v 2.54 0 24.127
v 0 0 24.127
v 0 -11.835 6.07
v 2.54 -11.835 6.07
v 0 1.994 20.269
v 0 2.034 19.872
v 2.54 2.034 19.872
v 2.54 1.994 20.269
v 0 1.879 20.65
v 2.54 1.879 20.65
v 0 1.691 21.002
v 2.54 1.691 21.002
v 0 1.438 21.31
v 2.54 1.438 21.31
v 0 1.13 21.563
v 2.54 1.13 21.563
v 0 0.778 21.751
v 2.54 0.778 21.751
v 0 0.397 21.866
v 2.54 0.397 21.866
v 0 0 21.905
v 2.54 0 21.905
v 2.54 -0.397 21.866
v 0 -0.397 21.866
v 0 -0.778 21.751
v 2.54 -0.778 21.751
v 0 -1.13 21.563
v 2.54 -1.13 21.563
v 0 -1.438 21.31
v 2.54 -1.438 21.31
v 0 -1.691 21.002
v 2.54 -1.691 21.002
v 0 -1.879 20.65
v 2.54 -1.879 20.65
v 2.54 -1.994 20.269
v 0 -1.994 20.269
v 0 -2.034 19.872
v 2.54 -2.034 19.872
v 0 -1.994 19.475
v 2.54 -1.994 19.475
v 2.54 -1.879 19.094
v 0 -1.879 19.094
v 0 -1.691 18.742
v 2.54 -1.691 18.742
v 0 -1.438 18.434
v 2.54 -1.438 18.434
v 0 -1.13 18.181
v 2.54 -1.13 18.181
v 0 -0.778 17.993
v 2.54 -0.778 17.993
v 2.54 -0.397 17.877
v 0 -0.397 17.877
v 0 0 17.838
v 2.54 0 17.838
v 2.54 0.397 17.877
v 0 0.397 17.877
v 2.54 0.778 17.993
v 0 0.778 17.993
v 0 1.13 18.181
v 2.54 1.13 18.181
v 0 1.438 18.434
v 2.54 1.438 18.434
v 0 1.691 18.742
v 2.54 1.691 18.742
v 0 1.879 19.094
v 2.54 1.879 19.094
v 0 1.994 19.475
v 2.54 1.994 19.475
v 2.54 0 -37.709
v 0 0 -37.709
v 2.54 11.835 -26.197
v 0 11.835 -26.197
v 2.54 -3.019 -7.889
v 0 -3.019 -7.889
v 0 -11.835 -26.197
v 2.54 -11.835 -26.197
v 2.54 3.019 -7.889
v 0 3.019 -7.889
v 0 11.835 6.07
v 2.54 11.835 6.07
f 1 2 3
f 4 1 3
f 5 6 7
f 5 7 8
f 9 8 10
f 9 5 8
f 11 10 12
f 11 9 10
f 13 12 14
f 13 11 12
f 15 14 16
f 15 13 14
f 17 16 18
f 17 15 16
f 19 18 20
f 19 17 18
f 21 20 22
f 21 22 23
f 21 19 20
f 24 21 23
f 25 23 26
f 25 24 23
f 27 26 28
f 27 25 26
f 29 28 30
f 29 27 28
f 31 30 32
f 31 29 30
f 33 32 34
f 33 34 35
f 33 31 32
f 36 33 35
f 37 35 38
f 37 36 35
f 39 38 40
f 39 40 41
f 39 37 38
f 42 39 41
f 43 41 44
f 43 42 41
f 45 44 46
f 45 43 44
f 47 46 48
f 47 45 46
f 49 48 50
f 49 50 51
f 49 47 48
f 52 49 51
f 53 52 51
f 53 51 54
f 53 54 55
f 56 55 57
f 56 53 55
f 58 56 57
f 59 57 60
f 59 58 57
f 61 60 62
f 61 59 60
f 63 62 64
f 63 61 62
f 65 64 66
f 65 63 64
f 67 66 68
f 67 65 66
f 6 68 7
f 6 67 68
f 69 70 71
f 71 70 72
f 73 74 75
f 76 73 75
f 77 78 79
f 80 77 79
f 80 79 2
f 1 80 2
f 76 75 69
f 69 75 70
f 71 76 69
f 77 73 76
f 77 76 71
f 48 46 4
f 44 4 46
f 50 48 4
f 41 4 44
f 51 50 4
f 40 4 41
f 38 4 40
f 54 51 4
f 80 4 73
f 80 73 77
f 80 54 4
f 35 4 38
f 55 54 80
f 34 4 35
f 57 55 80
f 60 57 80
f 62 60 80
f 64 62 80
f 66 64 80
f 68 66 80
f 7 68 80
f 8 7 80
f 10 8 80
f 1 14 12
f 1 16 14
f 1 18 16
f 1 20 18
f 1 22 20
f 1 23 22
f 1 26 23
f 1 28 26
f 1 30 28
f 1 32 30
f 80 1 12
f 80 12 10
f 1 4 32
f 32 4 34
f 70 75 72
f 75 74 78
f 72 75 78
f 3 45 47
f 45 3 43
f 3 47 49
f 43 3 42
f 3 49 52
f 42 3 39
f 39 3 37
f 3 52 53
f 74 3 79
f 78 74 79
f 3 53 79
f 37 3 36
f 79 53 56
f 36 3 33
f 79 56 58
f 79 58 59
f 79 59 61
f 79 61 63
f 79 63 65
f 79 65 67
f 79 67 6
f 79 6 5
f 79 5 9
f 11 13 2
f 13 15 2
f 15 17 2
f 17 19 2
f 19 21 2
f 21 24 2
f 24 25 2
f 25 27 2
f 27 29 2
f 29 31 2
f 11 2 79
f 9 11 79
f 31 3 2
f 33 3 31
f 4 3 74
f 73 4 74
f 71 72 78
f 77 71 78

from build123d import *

# Parameters (mm, degrees)
F0_R     = 2.033541
F1_DEPTH = 2.54


with BuildPart() as f1:
    # F0 (on Right) → F1 (new body)
    with BuildSketch(Plane.YZ):
        Polygon((11.83471, 6.069755), (0, 24.1271), (-11.83471, 6.069755), (-3.018506, -7.88928), (-11.83471, -26.197118), (0, -37.708839), (11.83471, -26.197118), (3.018506, -7.88928), align=None)
        with Locations((0, 19.871799)):
            Circle(F0_R, mode=Mode.SUBTRACT)
    extrude(amount=F1_DEPTH)


solid = f1.part
